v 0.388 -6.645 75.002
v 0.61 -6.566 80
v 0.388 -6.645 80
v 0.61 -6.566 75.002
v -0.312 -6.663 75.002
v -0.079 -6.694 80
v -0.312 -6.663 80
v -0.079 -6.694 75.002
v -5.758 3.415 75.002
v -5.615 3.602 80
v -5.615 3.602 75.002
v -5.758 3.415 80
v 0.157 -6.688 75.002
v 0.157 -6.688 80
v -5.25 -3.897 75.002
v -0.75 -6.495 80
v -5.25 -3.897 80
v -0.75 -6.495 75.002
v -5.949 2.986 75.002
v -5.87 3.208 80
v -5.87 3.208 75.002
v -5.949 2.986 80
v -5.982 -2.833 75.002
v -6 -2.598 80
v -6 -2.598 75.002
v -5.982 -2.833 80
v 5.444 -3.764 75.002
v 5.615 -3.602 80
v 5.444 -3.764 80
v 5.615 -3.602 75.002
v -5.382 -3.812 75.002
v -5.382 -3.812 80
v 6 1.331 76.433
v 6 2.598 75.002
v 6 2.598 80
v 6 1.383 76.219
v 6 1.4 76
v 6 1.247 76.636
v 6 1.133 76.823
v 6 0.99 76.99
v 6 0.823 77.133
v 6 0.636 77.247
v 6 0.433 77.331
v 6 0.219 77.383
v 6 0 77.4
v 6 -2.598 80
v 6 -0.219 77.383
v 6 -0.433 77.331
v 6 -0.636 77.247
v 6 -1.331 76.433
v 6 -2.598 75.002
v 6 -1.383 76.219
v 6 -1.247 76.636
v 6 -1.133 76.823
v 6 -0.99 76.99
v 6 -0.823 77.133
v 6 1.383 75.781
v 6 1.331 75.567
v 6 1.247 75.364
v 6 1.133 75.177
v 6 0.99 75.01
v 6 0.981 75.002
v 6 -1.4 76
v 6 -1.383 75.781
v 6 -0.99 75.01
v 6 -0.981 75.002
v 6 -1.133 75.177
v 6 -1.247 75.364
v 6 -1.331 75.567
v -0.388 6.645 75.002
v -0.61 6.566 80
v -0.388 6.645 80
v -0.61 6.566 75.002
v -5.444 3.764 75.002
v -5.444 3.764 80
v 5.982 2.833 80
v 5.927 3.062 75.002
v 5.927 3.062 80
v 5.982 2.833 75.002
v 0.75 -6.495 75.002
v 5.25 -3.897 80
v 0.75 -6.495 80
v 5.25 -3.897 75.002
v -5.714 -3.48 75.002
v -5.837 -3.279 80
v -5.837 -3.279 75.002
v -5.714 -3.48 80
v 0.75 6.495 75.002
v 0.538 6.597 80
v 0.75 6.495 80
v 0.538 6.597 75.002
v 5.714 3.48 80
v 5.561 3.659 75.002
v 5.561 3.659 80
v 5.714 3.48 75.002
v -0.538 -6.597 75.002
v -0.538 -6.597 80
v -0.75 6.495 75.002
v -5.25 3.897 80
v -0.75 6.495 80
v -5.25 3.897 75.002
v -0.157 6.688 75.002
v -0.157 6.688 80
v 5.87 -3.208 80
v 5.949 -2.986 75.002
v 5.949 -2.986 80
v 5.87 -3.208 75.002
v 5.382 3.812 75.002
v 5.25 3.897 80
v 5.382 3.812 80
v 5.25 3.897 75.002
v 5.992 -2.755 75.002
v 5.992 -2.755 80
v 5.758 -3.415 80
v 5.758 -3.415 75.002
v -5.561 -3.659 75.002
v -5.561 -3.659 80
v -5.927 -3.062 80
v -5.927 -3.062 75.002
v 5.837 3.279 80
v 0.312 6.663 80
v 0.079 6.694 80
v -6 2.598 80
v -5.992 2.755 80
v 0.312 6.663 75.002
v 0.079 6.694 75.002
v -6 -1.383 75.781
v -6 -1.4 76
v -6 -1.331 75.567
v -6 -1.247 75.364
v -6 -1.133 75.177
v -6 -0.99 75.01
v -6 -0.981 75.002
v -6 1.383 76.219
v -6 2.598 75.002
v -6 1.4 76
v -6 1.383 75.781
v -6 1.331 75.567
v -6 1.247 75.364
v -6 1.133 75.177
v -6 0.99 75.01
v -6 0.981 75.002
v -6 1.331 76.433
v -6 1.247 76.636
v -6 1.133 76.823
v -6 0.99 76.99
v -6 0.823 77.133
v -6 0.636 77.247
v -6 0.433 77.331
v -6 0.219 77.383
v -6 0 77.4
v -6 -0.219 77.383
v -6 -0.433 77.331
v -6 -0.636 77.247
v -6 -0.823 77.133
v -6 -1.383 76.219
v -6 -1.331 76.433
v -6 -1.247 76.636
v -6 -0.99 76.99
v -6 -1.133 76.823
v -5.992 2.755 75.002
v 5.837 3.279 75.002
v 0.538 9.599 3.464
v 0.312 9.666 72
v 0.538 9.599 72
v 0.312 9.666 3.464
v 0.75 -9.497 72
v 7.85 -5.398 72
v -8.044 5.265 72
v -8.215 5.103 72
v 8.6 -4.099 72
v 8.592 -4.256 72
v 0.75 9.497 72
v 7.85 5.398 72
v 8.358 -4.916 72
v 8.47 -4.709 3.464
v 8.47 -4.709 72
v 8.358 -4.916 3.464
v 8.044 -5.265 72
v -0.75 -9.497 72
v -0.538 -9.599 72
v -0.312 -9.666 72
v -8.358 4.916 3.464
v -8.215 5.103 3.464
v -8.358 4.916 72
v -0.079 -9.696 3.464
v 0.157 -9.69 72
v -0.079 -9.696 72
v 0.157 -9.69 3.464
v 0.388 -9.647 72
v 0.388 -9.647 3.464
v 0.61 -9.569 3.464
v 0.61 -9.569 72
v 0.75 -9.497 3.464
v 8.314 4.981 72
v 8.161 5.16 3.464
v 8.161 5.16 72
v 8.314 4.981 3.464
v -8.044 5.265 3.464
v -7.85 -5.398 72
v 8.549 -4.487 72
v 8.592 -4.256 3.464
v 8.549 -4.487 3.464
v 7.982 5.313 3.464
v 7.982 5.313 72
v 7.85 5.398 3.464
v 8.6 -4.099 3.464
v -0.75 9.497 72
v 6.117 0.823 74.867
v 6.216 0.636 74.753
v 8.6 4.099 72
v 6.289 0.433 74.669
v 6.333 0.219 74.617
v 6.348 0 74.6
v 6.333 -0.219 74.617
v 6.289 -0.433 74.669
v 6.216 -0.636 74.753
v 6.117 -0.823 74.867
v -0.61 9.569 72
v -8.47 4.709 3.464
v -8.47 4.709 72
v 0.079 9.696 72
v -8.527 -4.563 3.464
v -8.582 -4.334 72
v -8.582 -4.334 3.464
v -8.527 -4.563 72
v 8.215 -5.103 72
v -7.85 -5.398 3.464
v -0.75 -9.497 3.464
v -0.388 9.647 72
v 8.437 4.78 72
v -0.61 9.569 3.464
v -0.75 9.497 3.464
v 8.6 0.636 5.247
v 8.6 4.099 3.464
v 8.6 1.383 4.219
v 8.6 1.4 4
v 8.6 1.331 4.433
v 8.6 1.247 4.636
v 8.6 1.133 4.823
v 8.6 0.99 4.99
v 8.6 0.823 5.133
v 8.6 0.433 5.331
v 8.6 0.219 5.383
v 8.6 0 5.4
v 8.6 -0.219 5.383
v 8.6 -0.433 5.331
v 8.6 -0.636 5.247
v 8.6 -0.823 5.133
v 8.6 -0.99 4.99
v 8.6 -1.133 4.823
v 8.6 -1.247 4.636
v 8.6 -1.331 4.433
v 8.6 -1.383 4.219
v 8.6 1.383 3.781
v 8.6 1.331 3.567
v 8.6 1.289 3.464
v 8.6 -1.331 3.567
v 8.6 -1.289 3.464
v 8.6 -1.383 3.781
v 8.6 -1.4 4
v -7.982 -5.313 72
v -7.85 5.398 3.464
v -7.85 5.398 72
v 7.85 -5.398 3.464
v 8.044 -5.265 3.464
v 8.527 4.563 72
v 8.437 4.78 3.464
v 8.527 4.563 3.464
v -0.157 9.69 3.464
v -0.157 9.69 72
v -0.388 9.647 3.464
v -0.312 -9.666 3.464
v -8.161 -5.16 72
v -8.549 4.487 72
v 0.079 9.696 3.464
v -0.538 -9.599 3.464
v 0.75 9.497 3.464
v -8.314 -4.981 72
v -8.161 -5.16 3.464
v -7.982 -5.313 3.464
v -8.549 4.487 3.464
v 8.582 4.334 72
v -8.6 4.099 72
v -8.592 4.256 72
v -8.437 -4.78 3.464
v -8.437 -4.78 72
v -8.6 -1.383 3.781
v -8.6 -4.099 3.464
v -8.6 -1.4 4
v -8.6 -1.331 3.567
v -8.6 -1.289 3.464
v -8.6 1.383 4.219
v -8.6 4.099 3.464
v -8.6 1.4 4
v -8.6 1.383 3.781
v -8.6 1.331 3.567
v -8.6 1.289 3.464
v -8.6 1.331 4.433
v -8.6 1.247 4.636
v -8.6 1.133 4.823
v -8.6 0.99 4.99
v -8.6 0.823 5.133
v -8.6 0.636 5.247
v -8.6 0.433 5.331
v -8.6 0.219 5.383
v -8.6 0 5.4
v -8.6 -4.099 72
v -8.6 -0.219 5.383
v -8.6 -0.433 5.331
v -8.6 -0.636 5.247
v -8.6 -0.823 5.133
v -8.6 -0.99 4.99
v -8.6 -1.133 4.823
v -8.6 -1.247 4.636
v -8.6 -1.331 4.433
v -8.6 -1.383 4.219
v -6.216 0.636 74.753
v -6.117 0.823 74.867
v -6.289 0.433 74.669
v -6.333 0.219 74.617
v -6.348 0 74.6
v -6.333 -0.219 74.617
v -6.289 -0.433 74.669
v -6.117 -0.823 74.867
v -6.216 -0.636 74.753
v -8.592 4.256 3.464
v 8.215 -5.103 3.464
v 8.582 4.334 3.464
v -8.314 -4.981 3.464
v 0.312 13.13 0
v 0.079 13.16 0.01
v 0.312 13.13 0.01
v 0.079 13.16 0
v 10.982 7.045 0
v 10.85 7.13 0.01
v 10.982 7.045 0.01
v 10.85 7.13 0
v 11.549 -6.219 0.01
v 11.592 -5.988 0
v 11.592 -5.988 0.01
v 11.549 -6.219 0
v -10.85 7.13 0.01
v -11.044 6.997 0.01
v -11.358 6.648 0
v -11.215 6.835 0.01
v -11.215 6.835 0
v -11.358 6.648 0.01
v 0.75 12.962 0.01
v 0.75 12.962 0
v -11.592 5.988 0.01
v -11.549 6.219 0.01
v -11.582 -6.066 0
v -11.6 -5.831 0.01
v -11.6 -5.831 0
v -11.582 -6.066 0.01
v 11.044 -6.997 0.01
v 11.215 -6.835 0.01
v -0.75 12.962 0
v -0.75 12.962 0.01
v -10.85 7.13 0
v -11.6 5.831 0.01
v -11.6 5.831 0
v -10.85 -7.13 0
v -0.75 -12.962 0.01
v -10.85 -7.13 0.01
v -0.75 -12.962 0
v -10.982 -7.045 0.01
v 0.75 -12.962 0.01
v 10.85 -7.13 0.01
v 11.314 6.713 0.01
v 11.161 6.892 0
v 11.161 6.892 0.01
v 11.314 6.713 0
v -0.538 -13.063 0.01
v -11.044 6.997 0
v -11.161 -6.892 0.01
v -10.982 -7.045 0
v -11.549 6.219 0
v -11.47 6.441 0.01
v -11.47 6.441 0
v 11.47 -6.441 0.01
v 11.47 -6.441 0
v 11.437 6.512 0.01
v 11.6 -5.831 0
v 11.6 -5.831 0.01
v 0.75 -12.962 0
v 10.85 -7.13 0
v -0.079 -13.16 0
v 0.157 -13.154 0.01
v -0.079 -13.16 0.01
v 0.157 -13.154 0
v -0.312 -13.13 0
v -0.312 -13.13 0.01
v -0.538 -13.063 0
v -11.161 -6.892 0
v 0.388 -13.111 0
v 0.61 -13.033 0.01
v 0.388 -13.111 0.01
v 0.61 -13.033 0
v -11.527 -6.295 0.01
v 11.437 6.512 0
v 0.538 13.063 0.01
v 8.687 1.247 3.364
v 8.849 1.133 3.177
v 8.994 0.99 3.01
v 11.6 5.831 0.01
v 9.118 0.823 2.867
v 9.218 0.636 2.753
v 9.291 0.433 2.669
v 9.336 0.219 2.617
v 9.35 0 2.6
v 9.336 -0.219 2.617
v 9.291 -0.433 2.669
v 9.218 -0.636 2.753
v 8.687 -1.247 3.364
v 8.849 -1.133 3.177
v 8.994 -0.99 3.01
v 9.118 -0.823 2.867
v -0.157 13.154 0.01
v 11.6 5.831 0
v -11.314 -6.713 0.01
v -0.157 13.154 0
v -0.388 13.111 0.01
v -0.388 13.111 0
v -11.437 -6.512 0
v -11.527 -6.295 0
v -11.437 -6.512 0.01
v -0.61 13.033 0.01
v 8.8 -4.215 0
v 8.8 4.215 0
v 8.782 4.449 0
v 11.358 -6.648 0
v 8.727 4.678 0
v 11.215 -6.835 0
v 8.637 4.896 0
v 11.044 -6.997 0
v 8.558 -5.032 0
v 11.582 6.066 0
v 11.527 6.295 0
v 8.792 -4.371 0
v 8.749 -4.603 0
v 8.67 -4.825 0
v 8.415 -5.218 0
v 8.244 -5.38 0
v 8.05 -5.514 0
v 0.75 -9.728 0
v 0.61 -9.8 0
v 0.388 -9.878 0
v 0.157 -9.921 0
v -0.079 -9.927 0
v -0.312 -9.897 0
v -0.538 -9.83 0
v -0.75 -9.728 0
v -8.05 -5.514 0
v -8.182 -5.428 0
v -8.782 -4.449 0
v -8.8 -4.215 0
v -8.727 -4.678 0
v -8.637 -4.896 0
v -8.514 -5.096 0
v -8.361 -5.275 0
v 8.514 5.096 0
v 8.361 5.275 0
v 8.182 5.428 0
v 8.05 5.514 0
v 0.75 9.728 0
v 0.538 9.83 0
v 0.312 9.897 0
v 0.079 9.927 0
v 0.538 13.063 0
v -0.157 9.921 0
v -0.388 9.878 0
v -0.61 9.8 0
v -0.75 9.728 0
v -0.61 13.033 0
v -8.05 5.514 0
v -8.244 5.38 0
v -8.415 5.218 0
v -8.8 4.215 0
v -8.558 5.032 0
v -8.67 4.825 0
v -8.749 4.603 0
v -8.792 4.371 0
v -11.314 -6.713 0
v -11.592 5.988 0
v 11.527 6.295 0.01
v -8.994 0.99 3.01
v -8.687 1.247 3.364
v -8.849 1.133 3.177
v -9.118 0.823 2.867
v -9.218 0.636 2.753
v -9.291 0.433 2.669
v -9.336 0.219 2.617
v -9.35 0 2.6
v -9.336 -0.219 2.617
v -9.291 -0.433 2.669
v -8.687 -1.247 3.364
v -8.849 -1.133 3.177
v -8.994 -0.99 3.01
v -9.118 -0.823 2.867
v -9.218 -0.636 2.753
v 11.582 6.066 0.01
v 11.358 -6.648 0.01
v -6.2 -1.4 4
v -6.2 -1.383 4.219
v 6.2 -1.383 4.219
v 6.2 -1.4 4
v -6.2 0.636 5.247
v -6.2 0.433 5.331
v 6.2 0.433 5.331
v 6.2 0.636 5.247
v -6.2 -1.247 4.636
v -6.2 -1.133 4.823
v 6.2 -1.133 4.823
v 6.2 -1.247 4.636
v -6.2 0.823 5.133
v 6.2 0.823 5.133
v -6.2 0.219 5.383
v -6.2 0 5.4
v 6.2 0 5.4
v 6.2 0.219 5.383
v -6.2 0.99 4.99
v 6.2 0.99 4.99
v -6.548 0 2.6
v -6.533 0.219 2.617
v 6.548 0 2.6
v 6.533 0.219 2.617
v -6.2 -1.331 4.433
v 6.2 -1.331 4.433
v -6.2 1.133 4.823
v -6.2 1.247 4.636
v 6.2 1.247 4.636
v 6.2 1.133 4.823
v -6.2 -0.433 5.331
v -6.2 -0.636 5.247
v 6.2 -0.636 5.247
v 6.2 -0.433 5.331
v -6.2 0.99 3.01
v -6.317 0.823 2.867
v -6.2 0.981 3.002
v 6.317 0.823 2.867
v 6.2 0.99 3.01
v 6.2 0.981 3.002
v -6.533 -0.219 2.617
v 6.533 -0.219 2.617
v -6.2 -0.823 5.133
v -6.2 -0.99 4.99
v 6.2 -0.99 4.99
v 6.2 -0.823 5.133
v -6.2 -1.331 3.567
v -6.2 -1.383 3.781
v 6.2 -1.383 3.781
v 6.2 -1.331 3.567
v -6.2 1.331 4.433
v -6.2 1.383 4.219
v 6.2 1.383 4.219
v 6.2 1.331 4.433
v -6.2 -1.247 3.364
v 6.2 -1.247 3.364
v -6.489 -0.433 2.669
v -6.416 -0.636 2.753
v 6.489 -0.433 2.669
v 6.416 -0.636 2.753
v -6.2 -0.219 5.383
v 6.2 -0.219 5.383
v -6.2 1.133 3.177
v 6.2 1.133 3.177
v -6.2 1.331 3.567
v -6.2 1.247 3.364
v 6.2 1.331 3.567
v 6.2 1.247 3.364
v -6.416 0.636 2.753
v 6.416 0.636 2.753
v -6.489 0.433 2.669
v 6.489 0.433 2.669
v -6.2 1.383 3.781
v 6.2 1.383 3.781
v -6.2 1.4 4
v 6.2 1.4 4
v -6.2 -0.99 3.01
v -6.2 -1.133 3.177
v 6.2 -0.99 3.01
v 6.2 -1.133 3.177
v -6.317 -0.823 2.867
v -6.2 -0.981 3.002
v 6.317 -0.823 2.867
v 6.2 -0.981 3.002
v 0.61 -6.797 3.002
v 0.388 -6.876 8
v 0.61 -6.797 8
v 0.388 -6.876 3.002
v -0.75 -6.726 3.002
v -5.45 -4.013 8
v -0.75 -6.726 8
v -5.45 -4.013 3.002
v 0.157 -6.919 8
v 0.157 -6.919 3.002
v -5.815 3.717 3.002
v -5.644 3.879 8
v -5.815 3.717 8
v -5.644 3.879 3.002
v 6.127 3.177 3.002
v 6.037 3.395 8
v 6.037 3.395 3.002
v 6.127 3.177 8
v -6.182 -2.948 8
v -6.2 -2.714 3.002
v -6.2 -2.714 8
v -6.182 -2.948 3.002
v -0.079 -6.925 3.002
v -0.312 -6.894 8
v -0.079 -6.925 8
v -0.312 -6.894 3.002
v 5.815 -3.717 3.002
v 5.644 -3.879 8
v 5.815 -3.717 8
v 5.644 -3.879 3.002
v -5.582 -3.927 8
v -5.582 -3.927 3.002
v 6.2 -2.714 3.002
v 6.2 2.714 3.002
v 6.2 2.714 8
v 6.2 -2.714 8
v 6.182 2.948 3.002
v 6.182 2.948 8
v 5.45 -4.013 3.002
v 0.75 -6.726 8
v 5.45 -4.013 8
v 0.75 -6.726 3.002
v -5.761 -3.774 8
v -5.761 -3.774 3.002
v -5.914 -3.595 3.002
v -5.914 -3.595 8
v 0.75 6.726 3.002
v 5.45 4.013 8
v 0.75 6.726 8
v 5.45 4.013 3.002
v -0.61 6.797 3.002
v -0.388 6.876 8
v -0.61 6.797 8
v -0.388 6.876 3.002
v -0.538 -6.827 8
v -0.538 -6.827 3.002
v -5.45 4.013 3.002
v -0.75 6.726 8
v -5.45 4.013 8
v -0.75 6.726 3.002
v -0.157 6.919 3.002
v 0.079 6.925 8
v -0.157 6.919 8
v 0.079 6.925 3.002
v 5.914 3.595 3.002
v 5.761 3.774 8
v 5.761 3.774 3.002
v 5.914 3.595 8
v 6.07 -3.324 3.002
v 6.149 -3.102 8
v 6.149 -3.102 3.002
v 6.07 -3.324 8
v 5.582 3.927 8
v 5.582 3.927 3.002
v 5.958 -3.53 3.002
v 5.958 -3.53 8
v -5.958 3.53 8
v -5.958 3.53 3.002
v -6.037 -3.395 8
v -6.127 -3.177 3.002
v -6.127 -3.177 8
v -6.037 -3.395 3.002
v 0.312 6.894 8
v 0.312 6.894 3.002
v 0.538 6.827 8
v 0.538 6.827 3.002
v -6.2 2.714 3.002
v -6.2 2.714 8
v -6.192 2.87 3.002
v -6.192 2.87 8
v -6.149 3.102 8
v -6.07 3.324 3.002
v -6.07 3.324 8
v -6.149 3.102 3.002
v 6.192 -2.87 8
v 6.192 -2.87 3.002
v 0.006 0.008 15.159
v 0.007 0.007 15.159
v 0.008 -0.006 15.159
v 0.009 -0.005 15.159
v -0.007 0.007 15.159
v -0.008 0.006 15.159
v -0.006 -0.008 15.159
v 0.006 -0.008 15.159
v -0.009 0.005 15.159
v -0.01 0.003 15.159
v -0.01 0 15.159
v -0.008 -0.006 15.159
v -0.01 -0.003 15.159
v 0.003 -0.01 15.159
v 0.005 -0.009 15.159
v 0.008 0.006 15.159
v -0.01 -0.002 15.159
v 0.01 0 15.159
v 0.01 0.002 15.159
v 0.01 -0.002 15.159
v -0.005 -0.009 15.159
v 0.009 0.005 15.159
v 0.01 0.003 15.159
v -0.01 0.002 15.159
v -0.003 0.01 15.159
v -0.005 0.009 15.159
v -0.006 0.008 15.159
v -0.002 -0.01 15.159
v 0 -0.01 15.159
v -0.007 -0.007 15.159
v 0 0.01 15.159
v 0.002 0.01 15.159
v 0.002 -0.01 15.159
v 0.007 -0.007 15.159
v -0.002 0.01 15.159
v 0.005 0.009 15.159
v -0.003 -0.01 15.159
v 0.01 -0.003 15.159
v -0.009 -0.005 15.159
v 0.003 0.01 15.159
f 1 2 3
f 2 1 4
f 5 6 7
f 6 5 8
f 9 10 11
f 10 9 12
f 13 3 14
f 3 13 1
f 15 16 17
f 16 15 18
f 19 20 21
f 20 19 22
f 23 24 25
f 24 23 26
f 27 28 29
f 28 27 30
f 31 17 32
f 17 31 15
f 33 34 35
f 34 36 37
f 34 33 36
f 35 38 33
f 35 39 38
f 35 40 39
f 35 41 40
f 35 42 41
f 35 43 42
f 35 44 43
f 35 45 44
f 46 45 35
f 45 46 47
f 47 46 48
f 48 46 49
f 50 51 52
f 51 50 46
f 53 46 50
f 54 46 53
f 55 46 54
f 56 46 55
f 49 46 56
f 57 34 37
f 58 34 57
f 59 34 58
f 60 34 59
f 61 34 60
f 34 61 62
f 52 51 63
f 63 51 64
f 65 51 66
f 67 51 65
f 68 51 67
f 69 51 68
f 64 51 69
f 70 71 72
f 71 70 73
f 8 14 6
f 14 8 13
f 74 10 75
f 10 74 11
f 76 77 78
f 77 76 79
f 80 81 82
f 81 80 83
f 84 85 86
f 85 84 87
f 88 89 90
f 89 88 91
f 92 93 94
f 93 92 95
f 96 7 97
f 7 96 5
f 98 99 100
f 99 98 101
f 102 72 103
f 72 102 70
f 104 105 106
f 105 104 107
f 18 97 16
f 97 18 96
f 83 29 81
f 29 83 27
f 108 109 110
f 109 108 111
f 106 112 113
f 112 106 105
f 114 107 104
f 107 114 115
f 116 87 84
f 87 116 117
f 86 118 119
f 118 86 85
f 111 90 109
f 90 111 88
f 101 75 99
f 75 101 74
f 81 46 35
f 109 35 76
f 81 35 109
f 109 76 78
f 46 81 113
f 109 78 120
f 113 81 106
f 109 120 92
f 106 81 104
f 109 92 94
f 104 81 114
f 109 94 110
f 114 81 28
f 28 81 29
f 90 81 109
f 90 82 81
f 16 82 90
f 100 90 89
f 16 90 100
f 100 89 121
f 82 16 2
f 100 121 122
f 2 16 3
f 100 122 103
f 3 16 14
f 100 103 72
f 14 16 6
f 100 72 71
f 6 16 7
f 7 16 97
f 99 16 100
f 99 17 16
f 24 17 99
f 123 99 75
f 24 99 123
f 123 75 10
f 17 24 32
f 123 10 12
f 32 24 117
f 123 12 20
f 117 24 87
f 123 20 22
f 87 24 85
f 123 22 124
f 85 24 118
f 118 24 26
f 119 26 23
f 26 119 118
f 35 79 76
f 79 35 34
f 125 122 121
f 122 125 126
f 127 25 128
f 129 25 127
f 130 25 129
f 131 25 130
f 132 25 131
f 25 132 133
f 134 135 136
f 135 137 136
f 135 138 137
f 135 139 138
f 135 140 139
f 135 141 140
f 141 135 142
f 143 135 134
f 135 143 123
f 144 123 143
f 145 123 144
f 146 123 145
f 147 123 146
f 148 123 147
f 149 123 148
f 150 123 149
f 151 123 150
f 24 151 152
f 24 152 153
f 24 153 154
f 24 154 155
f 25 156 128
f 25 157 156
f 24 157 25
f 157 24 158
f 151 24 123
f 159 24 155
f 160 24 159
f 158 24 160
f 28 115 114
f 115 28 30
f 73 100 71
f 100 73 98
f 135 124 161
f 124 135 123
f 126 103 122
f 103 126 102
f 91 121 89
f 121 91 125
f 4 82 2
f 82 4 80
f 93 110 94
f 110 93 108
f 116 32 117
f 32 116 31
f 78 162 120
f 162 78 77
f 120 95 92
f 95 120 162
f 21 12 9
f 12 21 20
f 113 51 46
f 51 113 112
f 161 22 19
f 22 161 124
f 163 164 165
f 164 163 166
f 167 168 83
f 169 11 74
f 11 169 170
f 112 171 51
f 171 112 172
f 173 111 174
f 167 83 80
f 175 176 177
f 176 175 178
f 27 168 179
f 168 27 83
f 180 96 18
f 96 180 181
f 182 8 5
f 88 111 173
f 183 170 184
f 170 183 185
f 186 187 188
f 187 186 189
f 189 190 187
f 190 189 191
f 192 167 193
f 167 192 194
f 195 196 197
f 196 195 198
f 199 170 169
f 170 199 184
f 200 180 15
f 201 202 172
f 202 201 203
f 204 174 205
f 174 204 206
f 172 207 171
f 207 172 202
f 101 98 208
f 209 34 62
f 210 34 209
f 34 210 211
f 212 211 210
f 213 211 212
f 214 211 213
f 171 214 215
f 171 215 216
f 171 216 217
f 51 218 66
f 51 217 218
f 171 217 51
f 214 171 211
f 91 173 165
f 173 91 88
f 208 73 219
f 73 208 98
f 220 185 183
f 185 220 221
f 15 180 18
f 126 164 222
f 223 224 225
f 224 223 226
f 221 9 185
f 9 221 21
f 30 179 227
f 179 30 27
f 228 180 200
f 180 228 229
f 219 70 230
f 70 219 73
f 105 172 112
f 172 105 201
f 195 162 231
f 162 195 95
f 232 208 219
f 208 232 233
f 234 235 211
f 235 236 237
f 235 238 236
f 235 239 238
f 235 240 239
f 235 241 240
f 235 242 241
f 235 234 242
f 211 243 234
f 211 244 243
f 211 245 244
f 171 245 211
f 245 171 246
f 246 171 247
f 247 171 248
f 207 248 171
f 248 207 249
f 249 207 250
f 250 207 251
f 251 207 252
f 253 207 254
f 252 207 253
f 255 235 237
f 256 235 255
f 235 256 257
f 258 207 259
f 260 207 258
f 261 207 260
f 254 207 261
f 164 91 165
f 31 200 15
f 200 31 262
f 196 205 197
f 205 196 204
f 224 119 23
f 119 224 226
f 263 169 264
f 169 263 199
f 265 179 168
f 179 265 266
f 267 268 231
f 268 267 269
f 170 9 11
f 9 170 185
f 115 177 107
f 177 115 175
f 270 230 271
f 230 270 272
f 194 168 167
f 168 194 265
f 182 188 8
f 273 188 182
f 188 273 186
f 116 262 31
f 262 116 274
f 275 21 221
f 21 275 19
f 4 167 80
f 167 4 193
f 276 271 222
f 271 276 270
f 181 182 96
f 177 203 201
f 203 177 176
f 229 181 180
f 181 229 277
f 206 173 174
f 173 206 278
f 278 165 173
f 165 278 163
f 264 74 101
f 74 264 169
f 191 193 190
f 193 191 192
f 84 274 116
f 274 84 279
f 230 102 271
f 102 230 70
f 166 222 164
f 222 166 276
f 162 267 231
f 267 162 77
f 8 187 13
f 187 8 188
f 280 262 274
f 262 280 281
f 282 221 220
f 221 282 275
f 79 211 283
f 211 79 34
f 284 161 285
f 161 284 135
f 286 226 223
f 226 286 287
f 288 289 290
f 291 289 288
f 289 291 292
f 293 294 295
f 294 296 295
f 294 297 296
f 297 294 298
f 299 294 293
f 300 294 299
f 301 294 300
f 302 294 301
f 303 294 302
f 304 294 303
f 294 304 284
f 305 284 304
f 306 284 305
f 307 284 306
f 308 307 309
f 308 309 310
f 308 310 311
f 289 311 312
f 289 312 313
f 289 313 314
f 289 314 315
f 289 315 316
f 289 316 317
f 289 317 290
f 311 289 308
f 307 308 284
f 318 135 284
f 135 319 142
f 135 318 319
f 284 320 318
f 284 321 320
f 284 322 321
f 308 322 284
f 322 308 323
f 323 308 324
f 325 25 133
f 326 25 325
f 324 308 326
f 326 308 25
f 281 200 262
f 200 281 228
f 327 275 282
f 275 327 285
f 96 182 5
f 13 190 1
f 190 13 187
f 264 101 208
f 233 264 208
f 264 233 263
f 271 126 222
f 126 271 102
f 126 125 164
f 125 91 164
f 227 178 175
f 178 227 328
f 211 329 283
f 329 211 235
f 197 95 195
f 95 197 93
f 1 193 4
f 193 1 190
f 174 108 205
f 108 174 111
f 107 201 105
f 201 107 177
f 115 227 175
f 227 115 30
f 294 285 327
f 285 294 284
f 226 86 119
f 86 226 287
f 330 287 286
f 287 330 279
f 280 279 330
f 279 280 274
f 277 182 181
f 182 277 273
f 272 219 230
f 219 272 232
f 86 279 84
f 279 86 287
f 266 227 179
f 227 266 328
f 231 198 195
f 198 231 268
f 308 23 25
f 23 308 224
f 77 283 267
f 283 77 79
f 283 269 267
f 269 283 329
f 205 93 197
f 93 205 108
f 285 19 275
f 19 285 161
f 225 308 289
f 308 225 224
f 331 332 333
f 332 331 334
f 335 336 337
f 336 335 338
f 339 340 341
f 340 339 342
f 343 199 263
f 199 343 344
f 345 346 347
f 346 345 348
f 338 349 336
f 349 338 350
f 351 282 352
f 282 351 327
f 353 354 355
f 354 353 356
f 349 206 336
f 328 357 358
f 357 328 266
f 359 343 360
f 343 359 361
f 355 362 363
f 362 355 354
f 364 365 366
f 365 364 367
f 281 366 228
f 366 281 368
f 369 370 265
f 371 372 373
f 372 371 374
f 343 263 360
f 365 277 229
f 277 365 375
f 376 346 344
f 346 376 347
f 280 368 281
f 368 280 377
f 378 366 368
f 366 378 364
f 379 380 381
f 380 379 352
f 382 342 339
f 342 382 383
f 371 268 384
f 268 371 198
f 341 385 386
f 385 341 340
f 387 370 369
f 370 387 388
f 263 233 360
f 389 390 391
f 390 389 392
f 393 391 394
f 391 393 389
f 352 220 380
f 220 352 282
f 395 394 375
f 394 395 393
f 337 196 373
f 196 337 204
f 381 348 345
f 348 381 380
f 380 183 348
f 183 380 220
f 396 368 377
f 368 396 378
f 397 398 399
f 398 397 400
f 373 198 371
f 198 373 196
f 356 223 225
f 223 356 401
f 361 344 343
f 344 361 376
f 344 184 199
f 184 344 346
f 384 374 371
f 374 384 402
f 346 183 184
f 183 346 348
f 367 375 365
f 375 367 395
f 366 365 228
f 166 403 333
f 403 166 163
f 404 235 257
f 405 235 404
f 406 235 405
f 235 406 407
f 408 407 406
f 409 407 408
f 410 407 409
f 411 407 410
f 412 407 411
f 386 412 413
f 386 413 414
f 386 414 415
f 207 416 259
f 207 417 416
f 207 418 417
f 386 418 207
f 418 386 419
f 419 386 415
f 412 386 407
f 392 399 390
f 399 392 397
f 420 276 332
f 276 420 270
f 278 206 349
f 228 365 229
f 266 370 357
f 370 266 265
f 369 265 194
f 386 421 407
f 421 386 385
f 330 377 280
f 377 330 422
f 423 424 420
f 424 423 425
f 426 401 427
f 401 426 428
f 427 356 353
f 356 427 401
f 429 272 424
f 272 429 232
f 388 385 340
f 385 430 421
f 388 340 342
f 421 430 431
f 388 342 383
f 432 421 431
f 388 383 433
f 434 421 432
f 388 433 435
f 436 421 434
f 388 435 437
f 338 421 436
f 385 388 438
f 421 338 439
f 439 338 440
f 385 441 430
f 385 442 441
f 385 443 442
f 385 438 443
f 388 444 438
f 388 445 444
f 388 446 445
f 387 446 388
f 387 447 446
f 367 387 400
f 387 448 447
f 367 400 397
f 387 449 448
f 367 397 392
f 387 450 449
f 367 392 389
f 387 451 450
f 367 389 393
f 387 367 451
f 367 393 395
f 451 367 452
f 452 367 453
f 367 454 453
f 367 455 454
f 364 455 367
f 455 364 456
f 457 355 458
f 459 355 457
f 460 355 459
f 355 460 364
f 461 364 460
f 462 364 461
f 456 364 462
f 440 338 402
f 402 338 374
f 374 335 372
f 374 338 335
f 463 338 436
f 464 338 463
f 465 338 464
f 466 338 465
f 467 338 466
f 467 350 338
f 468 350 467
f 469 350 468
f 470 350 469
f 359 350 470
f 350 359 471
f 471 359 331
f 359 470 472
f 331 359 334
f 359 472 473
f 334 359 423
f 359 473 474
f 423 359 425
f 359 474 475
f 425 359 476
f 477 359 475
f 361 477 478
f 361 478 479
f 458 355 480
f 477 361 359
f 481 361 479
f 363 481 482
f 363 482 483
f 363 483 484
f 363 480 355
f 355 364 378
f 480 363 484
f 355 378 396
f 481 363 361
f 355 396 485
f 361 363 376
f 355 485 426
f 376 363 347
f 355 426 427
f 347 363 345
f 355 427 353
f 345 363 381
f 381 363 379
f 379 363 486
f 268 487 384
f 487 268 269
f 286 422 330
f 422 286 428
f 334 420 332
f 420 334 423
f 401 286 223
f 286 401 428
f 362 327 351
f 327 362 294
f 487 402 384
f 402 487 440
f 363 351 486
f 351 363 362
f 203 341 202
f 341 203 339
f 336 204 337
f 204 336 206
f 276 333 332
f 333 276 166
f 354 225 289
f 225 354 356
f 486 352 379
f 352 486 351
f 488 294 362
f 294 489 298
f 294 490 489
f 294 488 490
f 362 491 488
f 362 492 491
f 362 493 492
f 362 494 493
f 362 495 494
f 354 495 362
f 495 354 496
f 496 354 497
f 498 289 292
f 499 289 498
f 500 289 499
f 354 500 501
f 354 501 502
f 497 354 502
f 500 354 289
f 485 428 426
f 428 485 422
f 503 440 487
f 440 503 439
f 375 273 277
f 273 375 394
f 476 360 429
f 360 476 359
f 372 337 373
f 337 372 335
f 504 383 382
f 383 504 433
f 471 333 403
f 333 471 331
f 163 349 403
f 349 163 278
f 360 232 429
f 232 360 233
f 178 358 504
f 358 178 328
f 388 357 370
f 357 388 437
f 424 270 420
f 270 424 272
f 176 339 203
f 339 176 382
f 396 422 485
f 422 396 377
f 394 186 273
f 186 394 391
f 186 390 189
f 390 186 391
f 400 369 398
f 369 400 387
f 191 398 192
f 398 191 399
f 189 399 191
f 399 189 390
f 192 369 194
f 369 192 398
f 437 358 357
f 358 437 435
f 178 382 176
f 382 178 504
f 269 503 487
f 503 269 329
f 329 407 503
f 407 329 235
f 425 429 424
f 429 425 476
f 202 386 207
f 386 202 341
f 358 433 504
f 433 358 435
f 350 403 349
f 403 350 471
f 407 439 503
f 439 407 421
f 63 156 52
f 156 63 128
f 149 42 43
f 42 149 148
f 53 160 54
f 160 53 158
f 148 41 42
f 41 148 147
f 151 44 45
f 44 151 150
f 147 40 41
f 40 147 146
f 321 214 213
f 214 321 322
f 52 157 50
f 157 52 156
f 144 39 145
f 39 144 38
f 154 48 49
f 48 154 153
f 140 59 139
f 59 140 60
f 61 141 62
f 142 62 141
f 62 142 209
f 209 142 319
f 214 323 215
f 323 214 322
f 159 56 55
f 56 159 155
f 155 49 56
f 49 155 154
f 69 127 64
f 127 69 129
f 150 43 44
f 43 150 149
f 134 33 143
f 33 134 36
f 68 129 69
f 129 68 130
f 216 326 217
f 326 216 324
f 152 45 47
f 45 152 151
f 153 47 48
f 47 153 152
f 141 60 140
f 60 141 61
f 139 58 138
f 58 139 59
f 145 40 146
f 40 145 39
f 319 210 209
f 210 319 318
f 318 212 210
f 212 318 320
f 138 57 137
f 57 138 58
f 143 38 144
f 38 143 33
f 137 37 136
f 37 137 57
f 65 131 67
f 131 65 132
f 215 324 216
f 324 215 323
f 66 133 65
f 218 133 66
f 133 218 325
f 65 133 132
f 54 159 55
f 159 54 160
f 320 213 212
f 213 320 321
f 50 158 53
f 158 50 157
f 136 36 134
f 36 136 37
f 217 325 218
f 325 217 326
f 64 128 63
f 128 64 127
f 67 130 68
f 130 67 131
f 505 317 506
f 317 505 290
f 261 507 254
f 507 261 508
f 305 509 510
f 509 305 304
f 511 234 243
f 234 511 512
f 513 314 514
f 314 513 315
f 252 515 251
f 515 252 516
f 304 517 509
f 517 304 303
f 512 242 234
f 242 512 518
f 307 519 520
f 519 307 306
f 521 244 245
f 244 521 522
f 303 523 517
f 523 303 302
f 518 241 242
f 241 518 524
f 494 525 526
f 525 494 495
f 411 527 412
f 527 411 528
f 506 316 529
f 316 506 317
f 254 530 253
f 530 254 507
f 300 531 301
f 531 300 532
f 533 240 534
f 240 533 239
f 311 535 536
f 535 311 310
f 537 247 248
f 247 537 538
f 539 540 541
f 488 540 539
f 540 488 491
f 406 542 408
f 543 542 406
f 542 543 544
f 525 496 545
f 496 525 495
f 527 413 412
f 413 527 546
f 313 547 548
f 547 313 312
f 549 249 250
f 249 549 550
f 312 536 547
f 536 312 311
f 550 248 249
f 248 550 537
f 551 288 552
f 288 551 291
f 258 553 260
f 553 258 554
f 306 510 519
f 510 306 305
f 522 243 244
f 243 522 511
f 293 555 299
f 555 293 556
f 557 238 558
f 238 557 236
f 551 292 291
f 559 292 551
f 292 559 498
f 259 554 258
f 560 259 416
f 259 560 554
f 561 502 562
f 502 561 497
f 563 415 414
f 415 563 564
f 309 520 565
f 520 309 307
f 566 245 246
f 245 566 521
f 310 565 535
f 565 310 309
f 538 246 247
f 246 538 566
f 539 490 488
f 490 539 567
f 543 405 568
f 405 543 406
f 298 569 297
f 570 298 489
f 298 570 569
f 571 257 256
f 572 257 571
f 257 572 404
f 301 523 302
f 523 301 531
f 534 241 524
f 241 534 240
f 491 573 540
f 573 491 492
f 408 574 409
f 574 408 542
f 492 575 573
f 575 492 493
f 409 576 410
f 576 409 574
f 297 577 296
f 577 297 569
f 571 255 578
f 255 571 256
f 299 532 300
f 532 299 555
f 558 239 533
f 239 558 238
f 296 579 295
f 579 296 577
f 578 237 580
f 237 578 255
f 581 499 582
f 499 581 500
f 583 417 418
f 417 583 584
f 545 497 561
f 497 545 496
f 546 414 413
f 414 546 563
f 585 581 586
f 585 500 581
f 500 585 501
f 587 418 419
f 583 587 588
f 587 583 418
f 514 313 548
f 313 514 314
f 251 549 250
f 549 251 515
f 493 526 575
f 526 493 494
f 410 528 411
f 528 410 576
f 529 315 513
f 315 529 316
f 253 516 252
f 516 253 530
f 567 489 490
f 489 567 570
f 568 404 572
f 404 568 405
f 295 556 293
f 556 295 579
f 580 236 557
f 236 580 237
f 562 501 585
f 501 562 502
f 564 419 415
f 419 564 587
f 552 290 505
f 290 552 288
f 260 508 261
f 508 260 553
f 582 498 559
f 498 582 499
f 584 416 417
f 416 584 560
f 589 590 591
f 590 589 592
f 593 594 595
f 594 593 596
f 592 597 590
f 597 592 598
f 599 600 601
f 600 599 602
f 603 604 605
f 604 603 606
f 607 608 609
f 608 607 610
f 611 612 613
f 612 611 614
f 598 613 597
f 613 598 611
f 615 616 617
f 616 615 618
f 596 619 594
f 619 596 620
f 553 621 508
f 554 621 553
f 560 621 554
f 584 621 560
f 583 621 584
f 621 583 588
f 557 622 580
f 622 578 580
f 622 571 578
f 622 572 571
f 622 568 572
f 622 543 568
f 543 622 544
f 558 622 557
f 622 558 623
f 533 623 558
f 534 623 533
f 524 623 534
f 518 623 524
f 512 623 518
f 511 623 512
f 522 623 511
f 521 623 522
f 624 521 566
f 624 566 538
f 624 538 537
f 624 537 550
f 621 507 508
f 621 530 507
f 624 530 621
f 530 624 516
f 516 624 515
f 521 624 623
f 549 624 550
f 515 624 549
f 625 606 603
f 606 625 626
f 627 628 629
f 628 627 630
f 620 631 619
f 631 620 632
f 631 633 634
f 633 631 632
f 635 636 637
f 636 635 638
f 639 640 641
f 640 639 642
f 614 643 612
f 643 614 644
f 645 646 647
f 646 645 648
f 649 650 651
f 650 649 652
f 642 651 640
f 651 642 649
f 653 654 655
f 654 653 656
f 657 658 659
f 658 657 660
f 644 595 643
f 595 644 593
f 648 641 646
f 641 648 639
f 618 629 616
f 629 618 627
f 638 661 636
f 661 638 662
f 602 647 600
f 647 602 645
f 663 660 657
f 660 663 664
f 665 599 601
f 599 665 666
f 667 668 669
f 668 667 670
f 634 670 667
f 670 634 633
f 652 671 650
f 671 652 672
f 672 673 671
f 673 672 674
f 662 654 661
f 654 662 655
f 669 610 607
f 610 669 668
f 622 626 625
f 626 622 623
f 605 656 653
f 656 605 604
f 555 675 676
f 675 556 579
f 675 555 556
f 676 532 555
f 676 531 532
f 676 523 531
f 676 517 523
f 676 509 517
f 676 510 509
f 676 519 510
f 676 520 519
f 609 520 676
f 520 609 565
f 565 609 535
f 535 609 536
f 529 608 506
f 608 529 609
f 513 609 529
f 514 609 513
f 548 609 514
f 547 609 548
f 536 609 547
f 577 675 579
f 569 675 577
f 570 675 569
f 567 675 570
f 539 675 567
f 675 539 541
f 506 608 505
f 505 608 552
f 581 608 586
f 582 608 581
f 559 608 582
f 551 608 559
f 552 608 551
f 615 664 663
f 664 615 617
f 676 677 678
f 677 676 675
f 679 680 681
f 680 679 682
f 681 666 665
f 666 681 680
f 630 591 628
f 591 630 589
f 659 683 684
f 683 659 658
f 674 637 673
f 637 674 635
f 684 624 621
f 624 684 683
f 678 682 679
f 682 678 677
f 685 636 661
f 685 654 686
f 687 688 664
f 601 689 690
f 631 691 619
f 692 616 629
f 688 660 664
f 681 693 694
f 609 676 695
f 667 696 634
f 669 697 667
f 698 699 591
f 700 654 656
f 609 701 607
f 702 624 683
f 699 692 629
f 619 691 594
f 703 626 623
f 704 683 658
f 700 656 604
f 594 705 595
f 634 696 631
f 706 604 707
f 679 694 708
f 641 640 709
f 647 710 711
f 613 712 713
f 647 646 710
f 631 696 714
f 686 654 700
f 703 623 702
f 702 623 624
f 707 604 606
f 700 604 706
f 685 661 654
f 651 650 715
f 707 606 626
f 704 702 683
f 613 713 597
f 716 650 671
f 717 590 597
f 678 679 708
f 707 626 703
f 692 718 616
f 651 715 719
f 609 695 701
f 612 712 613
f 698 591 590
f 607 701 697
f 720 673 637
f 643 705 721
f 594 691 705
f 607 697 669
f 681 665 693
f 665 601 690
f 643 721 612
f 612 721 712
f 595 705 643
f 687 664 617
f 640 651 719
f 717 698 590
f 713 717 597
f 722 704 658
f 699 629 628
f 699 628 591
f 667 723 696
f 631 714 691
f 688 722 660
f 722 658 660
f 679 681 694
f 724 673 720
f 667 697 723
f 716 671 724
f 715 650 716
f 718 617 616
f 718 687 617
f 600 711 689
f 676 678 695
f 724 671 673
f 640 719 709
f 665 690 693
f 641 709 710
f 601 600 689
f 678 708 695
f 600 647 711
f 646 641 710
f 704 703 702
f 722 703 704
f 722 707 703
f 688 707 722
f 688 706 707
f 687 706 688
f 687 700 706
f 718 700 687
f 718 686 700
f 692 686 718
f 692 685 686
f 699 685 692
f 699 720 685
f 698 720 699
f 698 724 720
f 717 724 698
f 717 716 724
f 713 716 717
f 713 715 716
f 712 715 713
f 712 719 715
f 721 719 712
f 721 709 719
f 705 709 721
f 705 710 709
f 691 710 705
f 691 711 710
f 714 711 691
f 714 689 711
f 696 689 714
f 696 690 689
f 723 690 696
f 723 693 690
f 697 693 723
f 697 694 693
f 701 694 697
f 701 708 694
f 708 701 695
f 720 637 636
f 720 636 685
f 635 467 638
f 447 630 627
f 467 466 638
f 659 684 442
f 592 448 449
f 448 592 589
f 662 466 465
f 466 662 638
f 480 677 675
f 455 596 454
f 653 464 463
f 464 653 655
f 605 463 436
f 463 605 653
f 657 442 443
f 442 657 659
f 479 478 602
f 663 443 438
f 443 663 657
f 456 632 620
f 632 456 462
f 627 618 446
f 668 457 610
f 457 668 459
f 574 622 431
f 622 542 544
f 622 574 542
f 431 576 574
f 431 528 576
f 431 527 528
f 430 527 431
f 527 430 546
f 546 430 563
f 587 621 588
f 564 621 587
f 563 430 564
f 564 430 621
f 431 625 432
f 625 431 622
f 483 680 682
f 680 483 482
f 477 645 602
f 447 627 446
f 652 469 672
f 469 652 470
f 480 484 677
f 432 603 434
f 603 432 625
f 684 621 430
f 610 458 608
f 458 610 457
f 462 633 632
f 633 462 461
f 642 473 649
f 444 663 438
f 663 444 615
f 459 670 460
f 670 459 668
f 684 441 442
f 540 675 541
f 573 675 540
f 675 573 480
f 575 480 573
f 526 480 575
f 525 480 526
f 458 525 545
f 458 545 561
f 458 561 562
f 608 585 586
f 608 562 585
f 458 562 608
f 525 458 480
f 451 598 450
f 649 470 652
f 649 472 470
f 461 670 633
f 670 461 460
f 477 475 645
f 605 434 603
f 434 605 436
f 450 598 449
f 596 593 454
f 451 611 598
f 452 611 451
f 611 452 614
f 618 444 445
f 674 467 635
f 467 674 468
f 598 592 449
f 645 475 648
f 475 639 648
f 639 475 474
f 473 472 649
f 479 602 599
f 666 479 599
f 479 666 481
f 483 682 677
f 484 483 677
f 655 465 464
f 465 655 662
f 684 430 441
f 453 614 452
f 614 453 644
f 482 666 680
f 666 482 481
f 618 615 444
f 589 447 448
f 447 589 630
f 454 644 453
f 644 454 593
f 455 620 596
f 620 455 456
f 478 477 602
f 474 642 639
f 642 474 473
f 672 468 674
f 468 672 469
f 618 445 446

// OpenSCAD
include <../lib/filament-spool-roller-lib.scad>;
$fn = 40;
beam();
